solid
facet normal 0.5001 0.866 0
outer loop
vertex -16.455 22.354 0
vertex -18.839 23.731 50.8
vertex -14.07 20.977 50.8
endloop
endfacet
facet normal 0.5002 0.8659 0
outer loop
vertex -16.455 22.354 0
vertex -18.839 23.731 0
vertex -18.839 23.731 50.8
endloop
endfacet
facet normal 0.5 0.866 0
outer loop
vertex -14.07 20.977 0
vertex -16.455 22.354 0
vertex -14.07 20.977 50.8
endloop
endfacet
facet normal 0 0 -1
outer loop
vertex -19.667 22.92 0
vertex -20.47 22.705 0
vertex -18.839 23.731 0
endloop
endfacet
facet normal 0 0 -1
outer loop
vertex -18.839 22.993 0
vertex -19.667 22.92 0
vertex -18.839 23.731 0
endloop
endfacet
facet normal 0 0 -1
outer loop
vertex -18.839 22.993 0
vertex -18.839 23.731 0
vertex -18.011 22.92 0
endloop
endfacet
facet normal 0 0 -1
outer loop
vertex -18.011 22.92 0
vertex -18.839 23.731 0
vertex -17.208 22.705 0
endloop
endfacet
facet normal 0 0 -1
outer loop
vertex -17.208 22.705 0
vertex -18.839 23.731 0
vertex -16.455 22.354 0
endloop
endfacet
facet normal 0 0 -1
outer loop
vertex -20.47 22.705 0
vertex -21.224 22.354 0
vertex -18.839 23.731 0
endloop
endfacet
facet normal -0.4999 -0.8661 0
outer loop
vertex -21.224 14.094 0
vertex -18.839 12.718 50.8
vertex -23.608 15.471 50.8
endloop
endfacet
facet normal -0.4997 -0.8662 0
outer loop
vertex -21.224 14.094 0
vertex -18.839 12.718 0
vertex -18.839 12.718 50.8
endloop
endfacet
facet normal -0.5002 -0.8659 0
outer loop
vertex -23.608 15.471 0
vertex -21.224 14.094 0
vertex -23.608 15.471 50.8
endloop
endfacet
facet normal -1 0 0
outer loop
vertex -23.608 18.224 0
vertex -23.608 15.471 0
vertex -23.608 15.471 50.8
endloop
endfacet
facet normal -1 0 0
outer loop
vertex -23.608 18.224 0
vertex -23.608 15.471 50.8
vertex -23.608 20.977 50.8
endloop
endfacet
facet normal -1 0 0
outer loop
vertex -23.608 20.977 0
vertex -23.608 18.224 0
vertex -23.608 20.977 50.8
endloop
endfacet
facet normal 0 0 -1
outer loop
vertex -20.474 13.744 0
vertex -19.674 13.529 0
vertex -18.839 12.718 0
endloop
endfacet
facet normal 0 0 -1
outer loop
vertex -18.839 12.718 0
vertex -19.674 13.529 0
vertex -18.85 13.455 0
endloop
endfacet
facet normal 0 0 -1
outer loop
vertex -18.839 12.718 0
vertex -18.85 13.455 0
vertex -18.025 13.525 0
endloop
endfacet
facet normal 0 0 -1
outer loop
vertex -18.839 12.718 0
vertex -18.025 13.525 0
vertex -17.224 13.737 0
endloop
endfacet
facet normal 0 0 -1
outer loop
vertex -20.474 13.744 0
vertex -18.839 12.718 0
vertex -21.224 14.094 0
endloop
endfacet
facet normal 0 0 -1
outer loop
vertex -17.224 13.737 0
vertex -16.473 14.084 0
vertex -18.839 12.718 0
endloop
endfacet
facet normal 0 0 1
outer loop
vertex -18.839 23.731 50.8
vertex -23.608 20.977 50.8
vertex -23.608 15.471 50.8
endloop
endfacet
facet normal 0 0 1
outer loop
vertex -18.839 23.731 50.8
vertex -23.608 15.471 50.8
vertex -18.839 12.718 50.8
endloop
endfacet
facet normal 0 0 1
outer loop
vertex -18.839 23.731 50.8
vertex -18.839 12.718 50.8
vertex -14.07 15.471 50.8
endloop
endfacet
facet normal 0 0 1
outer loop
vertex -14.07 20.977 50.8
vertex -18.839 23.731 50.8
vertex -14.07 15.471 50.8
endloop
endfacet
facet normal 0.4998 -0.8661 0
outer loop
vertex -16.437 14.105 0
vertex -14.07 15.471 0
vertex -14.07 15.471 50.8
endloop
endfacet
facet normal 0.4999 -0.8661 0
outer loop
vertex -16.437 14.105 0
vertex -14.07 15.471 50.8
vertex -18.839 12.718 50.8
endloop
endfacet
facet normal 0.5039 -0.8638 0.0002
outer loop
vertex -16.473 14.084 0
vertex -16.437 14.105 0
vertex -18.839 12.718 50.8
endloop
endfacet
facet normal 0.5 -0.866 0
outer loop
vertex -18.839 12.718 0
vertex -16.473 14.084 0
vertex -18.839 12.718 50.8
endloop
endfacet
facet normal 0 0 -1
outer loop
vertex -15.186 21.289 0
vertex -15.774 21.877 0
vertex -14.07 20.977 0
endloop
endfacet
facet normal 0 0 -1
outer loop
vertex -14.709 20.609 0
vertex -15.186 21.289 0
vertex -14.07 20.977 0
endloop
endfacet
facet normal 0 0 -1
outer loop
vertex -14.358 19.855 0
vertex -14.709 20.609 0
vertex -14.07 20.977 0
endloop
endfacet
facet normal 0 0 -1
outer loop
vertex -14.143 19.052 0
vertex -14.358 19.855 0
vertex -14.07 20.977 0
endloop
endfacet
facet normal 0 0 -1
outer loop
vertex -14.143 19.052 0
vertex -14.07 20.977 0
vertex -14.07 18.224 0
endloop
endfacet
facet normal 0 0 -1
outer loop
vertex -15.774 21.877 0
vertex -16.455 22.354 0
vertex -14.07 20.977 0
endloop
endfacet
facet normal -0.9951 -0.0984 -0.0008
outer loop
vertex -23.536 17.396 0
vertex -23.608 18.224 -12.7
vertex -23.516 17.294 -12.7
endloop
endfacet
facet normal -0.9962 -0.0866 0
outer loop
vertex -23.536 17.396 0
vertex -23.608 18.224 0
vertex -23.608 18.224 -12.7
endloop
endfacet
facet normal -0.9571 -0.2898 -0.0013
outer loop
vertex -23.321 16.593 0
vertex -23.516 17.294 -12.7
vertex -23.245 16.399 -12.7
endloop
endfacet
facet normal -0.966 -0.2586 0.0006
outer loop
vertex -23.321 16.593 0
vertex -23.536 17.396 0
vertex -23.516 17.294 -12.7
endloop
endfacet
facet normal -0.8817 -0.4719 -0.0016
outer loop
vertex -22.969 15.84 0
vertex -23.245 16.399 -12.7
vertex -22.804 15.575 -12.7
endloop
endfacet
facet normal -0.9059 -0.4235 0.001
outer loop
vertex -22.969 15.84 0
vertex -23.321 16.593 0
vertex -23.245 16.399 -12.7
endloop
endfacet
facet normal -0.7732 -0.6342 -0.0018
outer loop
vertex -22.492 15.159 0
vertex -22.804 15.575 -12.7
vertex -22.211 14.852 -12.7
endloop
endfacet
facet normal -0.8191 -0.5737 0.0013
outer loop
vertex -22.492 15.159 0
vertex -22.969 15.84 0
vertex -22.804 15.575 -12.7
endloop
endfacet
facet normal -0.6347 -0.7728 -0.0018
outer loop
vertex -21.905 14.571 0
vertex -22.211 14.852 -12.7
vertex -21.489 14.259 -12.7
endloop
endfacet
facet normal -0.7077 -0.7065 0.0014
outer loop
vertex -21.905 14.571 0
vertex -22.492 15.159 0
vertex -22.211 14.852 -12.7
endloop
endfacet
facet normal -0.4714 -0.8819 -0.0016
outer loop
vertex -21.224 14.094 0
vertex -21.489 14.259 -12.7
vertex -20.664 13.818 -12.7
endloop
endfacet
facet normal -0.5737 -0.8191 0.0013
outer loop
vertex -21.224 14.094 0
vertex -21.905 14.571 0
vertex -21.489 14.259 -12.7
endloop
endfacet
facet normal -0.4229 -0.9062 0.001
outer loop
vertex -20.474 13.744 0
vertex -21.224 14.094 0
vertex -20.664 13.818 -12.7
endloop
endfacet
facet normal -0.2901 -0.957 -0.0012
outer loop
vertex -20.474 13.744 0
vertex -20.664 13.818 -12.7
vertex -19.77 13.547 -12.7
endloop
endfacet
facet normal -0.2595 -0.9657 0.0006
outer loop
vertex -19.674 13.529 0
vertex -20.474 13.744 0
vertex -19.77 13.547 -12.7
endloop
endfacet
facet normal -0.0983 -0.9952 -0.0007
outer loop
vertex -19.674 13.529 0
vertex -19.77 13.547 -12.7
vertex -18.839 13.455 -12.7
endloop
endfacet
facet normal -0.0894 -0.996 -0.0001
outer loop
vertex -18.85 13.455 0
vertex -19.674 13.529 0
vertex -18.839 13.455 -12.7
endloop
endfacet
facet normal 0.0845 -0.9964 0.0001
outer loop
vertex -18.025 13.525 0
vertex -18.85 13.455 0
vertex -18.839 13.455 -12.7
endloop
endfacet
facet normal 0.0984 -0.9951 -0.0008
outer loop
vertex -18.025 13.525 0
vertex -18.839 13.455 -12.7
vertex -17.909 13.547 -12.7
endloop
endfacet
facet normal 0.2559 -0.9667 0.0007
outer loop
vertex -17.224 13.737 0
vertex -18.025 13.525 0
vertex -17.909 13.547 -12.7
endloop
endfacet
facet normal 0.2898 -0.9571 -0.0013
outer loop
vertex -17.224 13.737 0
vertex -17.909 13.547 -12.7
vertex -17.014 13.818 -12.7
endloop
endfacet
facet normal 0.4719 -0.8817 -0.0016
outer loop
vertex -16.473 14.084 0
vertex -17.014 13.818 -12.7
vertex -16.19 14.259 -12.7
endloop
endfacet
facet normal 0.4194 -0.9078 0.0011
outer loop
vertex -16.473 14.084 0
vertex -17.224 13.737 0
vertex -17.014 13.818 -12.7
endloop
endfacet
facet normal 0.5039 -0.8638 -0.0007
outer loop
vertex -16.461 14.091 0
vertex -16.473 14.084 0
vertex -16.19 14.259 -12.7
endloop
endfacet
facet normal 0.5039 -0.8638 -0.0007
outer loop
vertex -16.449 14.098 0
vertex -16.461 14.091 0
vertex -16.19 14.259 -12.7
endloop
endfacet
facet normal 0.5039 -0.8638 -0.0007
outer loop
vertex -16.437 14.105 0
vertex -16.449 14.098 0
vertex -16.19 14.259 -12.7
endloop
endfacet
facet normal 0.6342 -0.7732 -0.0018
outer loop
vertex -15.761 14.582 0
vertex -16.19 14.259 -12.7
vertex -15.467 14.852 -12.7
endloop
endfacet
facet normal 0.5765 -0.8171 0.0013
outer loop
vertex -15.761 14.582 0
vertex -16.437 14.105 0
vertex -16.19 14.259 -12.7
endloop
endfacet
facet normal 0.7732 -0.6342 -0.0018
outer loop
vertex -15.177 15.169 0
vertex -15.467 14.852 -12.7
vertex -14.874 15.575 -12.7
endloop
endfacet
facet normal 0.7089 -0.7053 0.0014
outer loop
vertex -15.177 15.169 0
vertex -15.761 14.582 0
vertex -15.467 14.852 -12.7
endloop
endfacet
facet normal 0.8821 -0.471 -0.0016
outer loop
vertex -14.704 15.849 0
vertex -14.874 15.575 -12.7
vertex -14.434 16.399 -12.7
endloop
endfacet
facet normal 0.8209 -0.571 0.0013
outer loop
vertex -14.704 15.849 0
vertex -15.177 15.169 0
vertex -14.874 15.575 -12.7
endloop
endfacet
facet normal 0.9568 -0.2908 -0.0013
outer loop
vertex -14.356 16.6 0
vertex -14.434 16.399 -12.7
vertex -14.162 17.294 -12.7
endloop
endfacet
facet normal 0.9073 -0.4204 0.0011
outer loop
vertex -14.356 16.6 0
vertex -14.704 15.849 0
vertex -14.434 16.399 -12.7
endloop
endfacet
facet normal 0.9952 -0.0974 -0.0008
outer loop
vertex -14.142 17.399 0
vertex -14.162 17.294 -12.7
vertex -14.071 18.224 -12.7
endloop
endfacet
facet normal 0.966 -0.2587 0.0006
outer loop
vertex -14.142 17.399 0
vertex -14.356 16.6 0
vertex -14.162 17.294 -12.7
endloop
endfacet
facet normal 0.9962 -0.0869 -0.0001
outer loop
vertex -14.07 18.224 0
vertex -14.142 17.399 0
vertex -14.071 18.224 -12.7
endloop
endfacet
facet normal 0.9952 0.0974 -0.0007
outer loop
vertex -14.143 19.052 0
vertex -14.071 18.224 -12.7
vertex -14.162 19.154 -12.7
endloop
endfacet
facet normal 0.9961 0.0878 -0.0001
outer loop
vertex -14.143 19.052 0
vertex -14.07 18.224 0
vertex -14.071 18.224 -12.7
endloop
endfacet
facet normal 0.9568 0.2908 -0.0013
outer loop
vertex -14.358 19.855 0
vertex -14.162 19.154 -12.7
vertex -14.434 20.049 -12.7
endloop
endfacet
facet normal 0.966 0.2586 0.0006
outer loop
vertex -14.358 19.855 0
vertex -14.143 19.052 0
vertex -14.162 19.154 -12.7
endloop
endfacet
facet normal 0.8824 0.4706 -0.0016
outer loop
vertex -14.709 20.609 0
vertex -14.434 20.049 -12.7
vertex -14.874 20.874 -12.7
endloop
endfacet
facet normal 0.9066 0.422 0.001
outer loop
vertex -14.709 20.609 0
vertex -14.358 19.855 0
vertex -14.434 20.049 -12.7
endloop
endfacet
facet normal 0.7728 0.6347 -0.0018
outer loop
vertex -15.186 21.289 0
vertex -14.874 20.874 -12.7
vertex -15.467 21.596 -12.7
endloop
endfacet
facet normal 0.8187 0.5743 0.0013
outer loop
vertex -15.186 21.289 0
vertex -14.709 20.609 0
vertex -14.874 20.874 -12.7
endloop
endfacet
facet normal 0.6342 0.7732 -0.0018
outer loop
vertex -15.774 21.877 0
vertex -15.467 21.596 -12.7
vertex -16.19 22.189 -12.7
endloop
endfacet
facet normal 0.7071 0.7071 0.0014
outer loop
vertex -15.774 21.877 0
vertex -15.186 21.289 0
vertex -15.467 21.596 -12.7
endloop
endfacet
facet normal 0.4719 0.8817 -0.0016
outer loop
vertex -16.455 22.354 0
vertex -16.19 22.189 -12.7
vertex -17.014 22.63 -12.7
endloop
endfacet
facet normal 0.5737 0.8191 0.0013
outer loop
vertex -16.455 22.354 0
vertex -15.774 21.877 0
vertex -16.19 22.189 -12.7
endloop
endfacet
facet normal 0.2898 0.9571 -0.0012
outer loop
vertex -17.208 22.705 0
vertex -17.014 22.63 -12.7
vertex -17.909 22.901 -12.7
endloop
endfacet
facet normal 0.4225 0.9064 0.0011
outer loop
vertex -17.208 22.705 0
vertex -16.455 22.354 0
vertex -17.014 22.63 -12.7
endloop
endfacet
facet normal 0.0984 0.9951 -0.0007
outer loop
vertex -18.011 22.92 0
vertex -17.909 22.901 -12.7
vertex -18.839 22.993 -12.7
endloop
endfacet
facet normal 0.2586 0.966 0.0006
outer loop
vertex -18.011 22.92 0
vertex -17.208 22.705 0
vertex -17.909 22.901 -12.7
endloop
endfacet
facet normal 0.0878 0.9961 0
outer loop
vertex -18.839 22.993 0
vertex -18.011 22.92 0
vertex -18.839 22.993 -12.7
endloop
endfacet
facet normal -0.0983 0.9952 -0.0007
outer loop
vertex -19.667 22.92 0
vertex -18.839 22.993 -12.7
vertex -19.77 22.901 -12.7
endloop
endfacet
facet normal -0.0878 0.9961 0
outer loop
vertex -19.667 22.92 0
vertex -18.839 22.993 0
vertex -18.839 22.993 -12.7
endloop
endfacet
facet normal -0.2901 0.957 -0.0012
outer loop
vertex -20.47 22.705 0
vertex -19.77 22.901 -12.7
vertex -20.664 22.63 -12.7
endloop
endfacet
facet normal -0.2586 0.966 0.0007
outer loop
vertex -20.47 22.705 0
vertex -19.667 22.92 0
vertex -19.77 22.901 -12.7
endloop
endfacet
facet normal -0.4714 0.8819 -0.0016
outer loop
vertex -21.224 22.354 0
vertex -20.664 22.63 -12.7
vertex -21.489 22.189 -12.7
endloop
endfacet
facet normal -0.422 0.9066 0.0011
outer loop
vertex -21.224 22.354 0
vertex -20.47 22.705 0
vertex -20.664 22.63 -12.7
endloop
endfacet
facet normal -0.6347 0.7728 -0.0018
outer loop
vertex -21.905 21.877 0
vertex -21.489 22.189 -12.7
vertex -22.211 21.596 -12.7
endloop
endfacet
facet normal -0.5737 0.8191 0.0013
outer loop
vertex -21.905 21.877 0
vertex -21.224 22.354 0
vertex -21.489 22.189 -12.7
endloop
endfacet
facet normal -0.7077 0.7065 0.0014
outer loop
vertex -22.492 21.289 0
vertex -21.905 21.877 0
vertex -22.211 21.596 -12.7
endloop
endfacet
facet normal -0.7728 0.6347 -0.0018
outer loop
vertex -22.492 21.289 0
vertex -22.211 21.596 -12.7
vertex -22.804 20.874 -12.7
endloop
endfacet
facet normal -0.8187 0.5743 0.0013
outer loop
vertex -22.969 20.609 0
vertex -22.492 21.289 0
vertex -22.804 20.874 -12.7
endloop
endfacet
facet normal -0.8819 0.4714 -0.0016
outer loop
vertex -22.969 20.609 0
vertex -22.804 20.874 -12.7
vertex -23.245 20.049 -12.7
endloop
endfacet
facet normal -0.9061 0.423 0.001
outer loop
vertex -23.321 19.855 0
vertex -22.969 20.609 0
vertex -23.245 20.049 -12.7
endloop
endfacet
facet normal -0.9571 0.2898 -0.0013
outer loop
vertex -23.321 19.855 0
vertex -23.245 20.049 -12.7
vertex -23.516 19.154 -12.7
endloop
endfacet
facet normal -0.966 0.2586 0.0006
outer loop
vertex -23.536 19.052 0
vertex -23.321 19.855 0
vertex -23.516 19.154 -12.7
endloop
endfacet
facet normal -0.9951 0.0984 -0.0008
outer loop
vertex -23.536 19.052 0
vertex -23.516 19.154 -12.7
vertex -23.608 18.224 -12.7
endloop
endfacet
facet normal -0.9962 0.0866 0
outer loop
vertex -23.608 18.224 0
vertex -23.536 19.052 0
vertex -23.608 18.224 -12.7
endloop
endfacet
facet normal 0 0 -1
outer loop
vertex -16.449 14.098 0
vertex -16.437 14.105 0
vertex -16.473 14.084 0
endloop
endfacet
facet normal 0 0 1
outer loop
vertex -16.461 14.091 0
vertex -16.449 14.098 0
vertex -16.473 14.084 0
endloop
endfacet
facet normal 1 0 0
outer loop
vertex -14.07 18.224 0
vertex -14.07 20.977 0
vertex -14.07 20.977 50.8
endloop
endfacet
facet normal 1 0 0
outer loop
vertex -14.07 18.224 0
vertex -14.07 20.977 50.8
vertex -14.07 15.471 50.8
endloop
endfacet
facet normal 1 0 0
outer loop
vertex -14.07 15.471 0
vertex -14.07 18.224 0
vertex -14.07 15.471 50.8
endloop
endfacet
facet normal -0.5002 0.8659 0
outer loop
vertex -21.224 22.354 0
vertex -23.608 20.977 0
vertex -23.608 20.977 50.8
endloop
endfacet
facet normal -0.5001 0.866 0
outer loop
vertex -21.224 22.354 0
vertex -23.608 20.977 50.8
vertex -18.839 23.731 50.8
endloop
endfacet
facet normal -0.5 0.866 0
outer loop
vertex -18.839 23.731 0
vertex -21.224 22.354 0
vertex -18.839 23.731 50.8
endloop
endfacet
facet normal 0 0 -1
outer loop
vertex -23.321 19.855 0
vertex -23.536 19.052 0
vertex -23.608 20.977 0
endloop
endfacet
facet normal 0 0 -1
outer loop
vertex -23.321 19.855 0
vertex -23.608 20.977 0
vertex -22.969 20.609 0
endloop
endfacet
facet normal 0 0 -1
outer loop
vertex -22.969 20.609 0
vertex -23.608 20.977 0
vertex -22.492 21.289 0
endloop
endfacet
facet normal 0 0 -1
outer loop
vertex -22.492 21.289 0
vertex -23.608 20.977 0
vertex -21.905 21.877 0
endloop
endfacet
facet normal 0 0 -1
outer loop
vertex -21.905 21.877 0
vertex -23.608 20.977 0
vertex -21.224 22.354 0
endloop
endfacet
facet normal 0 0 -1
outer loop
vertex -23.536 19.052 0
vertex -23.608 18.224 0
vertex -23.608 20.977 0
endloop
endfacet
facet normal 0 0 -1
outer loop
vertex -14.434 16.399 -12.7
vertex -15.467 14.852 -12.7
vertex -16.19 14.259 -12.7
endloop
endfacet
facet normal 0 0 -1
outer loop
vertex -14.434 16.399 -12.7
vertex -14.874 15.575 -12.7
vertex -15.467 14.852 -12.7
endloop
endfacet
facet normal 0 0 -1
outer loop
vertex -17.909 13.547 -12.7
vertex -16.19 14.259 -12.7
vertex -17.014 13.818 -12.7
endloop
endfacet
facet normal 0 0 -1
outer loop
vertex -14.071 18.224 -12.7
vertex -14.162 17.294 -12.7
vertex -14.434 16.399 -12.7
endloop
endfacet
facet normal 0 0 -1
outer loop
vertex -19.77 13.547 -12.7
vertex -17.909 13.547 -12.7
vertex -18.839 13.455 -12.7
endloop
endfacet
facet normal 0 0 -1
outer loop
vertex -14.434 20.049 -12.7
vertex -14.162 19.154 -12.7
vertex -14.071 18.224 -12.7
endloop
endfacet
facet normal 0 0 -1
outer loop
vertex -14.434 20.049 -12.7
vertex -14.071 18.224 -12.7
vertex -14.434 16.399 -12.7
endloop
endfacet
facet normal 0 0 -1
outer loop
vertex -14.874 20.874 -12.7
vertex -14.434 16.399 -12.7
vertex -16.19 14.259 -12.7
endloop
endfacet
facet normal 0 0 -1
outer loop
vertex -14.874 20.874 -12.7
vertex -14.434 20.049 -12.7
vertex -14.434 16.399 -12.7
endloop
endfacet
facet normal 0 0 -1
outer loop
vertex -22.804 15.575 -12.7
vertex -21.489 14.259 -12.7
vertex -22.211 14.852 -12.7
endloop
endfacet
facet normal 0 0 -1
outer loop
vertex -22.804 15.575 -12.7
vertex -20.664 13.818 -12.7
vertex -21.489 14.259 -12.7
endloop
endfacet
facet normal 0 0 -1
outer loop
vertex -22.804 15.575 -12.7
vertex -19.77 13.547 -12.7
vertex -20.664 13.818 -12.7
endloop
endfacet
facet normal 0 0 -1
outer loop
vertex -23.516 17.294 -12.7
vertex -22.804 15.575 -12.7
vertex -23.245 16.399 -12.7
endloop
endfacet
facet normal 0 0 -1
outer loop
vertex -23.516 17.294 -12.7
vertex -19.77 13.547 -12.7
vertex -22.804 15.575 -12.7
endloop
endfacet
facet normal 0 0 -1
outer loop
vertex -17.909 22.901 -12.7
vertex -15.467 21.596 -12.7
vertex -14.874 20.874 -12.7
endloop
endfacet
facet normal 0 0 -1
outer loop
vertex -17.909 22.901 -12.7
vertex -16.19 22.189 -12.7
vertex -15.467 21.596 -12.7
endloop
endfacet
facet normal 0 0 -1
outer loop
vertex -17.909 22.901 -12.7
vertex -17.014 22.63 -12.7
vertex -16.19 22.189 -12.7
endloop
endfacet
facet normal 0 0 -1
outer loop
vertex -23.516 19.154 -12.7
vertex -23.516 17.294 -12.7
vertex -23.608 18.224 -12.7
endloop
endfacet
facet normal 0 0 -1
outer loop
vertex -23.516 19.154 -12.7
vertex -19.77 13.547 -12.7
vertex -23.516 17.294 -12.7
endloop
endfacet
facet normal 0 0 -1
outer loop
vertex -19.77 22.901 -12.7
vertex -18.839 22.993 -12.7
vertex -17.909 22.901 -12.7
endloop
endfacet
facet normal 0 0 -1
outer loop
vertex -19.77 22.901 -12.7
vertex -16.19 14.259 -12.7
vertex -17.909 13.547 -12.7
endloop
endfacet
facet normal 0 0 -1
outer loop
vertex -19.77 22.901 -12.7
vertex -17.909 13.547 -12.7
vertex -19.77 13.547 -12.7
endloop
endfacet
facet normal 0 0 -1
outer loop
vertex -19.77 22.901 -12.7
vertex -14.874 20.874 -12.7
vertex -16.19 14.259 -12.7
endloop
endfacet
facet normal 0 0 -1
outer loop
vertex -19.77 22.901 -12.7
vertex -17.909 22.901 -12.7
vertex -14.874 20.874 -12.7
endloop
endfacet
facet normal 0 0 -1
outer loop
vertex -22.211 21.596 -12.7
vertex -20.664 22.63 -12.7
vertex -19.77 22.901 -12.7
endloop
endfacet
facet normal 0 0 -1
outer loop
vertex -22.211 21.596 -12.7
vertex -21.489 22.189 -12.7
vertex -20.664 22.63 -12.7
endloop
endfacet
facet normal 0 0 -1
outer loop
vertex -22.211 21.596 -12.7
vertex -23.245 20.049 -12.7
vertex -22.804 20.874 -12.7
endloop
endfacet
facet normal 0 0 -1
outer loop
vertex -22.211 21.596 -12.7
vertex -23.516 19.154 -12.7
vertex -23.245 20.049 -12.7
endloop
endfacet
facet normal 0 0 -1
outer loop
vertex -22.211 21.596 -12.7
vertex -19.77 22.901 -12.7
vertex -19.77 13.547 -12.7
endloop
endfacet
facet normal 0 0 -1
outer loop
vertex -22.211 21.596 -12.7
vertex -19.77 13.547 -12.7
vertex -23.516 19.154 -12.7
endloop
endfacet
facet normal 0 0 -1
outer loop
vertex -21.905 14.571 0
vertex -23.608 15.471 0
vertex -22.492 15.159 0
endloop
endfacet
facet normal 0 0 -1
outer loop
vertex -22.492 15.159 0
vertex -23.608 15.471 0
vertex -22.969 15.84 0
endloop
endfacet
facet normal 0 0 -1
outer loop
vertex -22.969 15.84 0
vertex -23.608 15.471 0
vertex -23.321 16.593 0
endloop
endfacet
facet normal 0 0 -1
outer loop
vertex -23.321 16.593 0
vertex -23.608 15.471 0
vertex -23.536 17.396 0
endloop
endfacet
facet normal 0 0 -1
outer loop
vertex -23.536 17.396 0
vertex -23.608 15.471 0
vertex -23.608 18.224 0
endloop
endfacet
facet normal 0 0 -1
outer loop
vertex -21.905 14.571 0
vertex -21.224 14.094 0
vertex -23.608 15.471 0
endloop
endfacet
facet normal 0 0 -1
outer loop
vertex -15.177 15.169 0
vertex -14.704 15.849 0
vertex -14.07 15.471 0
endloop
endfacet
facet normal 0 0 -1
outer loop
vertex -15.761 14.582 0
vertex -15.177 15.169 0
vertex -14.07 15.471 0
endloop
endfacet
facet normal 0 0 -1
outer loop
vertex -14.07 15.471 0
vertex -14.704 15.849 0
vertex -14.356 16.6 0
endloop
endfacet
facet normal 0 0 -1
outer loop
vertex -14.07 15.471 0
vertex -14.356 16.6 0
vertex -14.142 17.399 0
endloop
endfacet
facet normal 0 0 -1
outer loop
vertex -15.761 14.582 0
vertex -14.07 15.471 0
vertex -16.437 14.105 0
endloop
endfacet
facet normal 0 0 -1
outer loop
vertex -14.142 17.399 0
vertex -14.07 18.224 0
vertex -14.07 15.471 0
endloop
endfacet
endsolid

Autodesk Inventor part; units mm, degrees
ref_plane "YZ Plane" through (0, 0, 0) normal (1, 0, 0) x (0, 1, 0)
ref_plane "XZ Plane" through (0, 0, 0) normal (0, 1, 0) x (-1, 0, 0)
ref_plane "XY Plane" through (0, 0, 0) normal (0, 0, 1) x (1, 0, 0)
sketch "Sketch1" plane through (0, 0, 0) normal (0, 0, 1) x (1, 0, 0)
  line L0 (-16.4487, 14.1051) -> (-9.6381, 18.058)
  line L1 (-16.4487, 14.1051) -> (-18.8393, 18.2241)
  line L2 (-18.8393, 12.7176) -> (-23.6081, 15.4709)
  line L3 (-23.6081, 15.4709) -> (-23.6081, 20.9774)
  line L4 (-23.6081, 20.9774) -> (-18.8393, 23.7306)
  line L5 (-18.8393, 23.7306) -> (-14.0705, 20.9774)
  line L6 (-14.0705, 20.9774) -> (-14.0705, 15.4709)
  line L7 (-14.0705, 15.4709) -> (-18.8393, 12.7176)
  dimension "d5" = 4.7625
extrude "Extrusion1" add sketch "Sketch1" along normal blind 50.8
sketch "Sketch3" plane through (0, 0, 0) normal (0, 0, -1) x (-1, 0, 0)
  line L0 (23.6081, 15.4709) -> (18.8393, 12.7176) projected
  line L1 (18.8393, 12.7176) -> (18.8393, 18.2241)
  circle A0 centre (18.8393, 18.2241) radius 4.7688
  point P0 (0, 0)
extrude "Extrusion3" add sketch "Sketch3" along normal blind 12.7 contours A0
properties part number "Sanded Hex Rod"
